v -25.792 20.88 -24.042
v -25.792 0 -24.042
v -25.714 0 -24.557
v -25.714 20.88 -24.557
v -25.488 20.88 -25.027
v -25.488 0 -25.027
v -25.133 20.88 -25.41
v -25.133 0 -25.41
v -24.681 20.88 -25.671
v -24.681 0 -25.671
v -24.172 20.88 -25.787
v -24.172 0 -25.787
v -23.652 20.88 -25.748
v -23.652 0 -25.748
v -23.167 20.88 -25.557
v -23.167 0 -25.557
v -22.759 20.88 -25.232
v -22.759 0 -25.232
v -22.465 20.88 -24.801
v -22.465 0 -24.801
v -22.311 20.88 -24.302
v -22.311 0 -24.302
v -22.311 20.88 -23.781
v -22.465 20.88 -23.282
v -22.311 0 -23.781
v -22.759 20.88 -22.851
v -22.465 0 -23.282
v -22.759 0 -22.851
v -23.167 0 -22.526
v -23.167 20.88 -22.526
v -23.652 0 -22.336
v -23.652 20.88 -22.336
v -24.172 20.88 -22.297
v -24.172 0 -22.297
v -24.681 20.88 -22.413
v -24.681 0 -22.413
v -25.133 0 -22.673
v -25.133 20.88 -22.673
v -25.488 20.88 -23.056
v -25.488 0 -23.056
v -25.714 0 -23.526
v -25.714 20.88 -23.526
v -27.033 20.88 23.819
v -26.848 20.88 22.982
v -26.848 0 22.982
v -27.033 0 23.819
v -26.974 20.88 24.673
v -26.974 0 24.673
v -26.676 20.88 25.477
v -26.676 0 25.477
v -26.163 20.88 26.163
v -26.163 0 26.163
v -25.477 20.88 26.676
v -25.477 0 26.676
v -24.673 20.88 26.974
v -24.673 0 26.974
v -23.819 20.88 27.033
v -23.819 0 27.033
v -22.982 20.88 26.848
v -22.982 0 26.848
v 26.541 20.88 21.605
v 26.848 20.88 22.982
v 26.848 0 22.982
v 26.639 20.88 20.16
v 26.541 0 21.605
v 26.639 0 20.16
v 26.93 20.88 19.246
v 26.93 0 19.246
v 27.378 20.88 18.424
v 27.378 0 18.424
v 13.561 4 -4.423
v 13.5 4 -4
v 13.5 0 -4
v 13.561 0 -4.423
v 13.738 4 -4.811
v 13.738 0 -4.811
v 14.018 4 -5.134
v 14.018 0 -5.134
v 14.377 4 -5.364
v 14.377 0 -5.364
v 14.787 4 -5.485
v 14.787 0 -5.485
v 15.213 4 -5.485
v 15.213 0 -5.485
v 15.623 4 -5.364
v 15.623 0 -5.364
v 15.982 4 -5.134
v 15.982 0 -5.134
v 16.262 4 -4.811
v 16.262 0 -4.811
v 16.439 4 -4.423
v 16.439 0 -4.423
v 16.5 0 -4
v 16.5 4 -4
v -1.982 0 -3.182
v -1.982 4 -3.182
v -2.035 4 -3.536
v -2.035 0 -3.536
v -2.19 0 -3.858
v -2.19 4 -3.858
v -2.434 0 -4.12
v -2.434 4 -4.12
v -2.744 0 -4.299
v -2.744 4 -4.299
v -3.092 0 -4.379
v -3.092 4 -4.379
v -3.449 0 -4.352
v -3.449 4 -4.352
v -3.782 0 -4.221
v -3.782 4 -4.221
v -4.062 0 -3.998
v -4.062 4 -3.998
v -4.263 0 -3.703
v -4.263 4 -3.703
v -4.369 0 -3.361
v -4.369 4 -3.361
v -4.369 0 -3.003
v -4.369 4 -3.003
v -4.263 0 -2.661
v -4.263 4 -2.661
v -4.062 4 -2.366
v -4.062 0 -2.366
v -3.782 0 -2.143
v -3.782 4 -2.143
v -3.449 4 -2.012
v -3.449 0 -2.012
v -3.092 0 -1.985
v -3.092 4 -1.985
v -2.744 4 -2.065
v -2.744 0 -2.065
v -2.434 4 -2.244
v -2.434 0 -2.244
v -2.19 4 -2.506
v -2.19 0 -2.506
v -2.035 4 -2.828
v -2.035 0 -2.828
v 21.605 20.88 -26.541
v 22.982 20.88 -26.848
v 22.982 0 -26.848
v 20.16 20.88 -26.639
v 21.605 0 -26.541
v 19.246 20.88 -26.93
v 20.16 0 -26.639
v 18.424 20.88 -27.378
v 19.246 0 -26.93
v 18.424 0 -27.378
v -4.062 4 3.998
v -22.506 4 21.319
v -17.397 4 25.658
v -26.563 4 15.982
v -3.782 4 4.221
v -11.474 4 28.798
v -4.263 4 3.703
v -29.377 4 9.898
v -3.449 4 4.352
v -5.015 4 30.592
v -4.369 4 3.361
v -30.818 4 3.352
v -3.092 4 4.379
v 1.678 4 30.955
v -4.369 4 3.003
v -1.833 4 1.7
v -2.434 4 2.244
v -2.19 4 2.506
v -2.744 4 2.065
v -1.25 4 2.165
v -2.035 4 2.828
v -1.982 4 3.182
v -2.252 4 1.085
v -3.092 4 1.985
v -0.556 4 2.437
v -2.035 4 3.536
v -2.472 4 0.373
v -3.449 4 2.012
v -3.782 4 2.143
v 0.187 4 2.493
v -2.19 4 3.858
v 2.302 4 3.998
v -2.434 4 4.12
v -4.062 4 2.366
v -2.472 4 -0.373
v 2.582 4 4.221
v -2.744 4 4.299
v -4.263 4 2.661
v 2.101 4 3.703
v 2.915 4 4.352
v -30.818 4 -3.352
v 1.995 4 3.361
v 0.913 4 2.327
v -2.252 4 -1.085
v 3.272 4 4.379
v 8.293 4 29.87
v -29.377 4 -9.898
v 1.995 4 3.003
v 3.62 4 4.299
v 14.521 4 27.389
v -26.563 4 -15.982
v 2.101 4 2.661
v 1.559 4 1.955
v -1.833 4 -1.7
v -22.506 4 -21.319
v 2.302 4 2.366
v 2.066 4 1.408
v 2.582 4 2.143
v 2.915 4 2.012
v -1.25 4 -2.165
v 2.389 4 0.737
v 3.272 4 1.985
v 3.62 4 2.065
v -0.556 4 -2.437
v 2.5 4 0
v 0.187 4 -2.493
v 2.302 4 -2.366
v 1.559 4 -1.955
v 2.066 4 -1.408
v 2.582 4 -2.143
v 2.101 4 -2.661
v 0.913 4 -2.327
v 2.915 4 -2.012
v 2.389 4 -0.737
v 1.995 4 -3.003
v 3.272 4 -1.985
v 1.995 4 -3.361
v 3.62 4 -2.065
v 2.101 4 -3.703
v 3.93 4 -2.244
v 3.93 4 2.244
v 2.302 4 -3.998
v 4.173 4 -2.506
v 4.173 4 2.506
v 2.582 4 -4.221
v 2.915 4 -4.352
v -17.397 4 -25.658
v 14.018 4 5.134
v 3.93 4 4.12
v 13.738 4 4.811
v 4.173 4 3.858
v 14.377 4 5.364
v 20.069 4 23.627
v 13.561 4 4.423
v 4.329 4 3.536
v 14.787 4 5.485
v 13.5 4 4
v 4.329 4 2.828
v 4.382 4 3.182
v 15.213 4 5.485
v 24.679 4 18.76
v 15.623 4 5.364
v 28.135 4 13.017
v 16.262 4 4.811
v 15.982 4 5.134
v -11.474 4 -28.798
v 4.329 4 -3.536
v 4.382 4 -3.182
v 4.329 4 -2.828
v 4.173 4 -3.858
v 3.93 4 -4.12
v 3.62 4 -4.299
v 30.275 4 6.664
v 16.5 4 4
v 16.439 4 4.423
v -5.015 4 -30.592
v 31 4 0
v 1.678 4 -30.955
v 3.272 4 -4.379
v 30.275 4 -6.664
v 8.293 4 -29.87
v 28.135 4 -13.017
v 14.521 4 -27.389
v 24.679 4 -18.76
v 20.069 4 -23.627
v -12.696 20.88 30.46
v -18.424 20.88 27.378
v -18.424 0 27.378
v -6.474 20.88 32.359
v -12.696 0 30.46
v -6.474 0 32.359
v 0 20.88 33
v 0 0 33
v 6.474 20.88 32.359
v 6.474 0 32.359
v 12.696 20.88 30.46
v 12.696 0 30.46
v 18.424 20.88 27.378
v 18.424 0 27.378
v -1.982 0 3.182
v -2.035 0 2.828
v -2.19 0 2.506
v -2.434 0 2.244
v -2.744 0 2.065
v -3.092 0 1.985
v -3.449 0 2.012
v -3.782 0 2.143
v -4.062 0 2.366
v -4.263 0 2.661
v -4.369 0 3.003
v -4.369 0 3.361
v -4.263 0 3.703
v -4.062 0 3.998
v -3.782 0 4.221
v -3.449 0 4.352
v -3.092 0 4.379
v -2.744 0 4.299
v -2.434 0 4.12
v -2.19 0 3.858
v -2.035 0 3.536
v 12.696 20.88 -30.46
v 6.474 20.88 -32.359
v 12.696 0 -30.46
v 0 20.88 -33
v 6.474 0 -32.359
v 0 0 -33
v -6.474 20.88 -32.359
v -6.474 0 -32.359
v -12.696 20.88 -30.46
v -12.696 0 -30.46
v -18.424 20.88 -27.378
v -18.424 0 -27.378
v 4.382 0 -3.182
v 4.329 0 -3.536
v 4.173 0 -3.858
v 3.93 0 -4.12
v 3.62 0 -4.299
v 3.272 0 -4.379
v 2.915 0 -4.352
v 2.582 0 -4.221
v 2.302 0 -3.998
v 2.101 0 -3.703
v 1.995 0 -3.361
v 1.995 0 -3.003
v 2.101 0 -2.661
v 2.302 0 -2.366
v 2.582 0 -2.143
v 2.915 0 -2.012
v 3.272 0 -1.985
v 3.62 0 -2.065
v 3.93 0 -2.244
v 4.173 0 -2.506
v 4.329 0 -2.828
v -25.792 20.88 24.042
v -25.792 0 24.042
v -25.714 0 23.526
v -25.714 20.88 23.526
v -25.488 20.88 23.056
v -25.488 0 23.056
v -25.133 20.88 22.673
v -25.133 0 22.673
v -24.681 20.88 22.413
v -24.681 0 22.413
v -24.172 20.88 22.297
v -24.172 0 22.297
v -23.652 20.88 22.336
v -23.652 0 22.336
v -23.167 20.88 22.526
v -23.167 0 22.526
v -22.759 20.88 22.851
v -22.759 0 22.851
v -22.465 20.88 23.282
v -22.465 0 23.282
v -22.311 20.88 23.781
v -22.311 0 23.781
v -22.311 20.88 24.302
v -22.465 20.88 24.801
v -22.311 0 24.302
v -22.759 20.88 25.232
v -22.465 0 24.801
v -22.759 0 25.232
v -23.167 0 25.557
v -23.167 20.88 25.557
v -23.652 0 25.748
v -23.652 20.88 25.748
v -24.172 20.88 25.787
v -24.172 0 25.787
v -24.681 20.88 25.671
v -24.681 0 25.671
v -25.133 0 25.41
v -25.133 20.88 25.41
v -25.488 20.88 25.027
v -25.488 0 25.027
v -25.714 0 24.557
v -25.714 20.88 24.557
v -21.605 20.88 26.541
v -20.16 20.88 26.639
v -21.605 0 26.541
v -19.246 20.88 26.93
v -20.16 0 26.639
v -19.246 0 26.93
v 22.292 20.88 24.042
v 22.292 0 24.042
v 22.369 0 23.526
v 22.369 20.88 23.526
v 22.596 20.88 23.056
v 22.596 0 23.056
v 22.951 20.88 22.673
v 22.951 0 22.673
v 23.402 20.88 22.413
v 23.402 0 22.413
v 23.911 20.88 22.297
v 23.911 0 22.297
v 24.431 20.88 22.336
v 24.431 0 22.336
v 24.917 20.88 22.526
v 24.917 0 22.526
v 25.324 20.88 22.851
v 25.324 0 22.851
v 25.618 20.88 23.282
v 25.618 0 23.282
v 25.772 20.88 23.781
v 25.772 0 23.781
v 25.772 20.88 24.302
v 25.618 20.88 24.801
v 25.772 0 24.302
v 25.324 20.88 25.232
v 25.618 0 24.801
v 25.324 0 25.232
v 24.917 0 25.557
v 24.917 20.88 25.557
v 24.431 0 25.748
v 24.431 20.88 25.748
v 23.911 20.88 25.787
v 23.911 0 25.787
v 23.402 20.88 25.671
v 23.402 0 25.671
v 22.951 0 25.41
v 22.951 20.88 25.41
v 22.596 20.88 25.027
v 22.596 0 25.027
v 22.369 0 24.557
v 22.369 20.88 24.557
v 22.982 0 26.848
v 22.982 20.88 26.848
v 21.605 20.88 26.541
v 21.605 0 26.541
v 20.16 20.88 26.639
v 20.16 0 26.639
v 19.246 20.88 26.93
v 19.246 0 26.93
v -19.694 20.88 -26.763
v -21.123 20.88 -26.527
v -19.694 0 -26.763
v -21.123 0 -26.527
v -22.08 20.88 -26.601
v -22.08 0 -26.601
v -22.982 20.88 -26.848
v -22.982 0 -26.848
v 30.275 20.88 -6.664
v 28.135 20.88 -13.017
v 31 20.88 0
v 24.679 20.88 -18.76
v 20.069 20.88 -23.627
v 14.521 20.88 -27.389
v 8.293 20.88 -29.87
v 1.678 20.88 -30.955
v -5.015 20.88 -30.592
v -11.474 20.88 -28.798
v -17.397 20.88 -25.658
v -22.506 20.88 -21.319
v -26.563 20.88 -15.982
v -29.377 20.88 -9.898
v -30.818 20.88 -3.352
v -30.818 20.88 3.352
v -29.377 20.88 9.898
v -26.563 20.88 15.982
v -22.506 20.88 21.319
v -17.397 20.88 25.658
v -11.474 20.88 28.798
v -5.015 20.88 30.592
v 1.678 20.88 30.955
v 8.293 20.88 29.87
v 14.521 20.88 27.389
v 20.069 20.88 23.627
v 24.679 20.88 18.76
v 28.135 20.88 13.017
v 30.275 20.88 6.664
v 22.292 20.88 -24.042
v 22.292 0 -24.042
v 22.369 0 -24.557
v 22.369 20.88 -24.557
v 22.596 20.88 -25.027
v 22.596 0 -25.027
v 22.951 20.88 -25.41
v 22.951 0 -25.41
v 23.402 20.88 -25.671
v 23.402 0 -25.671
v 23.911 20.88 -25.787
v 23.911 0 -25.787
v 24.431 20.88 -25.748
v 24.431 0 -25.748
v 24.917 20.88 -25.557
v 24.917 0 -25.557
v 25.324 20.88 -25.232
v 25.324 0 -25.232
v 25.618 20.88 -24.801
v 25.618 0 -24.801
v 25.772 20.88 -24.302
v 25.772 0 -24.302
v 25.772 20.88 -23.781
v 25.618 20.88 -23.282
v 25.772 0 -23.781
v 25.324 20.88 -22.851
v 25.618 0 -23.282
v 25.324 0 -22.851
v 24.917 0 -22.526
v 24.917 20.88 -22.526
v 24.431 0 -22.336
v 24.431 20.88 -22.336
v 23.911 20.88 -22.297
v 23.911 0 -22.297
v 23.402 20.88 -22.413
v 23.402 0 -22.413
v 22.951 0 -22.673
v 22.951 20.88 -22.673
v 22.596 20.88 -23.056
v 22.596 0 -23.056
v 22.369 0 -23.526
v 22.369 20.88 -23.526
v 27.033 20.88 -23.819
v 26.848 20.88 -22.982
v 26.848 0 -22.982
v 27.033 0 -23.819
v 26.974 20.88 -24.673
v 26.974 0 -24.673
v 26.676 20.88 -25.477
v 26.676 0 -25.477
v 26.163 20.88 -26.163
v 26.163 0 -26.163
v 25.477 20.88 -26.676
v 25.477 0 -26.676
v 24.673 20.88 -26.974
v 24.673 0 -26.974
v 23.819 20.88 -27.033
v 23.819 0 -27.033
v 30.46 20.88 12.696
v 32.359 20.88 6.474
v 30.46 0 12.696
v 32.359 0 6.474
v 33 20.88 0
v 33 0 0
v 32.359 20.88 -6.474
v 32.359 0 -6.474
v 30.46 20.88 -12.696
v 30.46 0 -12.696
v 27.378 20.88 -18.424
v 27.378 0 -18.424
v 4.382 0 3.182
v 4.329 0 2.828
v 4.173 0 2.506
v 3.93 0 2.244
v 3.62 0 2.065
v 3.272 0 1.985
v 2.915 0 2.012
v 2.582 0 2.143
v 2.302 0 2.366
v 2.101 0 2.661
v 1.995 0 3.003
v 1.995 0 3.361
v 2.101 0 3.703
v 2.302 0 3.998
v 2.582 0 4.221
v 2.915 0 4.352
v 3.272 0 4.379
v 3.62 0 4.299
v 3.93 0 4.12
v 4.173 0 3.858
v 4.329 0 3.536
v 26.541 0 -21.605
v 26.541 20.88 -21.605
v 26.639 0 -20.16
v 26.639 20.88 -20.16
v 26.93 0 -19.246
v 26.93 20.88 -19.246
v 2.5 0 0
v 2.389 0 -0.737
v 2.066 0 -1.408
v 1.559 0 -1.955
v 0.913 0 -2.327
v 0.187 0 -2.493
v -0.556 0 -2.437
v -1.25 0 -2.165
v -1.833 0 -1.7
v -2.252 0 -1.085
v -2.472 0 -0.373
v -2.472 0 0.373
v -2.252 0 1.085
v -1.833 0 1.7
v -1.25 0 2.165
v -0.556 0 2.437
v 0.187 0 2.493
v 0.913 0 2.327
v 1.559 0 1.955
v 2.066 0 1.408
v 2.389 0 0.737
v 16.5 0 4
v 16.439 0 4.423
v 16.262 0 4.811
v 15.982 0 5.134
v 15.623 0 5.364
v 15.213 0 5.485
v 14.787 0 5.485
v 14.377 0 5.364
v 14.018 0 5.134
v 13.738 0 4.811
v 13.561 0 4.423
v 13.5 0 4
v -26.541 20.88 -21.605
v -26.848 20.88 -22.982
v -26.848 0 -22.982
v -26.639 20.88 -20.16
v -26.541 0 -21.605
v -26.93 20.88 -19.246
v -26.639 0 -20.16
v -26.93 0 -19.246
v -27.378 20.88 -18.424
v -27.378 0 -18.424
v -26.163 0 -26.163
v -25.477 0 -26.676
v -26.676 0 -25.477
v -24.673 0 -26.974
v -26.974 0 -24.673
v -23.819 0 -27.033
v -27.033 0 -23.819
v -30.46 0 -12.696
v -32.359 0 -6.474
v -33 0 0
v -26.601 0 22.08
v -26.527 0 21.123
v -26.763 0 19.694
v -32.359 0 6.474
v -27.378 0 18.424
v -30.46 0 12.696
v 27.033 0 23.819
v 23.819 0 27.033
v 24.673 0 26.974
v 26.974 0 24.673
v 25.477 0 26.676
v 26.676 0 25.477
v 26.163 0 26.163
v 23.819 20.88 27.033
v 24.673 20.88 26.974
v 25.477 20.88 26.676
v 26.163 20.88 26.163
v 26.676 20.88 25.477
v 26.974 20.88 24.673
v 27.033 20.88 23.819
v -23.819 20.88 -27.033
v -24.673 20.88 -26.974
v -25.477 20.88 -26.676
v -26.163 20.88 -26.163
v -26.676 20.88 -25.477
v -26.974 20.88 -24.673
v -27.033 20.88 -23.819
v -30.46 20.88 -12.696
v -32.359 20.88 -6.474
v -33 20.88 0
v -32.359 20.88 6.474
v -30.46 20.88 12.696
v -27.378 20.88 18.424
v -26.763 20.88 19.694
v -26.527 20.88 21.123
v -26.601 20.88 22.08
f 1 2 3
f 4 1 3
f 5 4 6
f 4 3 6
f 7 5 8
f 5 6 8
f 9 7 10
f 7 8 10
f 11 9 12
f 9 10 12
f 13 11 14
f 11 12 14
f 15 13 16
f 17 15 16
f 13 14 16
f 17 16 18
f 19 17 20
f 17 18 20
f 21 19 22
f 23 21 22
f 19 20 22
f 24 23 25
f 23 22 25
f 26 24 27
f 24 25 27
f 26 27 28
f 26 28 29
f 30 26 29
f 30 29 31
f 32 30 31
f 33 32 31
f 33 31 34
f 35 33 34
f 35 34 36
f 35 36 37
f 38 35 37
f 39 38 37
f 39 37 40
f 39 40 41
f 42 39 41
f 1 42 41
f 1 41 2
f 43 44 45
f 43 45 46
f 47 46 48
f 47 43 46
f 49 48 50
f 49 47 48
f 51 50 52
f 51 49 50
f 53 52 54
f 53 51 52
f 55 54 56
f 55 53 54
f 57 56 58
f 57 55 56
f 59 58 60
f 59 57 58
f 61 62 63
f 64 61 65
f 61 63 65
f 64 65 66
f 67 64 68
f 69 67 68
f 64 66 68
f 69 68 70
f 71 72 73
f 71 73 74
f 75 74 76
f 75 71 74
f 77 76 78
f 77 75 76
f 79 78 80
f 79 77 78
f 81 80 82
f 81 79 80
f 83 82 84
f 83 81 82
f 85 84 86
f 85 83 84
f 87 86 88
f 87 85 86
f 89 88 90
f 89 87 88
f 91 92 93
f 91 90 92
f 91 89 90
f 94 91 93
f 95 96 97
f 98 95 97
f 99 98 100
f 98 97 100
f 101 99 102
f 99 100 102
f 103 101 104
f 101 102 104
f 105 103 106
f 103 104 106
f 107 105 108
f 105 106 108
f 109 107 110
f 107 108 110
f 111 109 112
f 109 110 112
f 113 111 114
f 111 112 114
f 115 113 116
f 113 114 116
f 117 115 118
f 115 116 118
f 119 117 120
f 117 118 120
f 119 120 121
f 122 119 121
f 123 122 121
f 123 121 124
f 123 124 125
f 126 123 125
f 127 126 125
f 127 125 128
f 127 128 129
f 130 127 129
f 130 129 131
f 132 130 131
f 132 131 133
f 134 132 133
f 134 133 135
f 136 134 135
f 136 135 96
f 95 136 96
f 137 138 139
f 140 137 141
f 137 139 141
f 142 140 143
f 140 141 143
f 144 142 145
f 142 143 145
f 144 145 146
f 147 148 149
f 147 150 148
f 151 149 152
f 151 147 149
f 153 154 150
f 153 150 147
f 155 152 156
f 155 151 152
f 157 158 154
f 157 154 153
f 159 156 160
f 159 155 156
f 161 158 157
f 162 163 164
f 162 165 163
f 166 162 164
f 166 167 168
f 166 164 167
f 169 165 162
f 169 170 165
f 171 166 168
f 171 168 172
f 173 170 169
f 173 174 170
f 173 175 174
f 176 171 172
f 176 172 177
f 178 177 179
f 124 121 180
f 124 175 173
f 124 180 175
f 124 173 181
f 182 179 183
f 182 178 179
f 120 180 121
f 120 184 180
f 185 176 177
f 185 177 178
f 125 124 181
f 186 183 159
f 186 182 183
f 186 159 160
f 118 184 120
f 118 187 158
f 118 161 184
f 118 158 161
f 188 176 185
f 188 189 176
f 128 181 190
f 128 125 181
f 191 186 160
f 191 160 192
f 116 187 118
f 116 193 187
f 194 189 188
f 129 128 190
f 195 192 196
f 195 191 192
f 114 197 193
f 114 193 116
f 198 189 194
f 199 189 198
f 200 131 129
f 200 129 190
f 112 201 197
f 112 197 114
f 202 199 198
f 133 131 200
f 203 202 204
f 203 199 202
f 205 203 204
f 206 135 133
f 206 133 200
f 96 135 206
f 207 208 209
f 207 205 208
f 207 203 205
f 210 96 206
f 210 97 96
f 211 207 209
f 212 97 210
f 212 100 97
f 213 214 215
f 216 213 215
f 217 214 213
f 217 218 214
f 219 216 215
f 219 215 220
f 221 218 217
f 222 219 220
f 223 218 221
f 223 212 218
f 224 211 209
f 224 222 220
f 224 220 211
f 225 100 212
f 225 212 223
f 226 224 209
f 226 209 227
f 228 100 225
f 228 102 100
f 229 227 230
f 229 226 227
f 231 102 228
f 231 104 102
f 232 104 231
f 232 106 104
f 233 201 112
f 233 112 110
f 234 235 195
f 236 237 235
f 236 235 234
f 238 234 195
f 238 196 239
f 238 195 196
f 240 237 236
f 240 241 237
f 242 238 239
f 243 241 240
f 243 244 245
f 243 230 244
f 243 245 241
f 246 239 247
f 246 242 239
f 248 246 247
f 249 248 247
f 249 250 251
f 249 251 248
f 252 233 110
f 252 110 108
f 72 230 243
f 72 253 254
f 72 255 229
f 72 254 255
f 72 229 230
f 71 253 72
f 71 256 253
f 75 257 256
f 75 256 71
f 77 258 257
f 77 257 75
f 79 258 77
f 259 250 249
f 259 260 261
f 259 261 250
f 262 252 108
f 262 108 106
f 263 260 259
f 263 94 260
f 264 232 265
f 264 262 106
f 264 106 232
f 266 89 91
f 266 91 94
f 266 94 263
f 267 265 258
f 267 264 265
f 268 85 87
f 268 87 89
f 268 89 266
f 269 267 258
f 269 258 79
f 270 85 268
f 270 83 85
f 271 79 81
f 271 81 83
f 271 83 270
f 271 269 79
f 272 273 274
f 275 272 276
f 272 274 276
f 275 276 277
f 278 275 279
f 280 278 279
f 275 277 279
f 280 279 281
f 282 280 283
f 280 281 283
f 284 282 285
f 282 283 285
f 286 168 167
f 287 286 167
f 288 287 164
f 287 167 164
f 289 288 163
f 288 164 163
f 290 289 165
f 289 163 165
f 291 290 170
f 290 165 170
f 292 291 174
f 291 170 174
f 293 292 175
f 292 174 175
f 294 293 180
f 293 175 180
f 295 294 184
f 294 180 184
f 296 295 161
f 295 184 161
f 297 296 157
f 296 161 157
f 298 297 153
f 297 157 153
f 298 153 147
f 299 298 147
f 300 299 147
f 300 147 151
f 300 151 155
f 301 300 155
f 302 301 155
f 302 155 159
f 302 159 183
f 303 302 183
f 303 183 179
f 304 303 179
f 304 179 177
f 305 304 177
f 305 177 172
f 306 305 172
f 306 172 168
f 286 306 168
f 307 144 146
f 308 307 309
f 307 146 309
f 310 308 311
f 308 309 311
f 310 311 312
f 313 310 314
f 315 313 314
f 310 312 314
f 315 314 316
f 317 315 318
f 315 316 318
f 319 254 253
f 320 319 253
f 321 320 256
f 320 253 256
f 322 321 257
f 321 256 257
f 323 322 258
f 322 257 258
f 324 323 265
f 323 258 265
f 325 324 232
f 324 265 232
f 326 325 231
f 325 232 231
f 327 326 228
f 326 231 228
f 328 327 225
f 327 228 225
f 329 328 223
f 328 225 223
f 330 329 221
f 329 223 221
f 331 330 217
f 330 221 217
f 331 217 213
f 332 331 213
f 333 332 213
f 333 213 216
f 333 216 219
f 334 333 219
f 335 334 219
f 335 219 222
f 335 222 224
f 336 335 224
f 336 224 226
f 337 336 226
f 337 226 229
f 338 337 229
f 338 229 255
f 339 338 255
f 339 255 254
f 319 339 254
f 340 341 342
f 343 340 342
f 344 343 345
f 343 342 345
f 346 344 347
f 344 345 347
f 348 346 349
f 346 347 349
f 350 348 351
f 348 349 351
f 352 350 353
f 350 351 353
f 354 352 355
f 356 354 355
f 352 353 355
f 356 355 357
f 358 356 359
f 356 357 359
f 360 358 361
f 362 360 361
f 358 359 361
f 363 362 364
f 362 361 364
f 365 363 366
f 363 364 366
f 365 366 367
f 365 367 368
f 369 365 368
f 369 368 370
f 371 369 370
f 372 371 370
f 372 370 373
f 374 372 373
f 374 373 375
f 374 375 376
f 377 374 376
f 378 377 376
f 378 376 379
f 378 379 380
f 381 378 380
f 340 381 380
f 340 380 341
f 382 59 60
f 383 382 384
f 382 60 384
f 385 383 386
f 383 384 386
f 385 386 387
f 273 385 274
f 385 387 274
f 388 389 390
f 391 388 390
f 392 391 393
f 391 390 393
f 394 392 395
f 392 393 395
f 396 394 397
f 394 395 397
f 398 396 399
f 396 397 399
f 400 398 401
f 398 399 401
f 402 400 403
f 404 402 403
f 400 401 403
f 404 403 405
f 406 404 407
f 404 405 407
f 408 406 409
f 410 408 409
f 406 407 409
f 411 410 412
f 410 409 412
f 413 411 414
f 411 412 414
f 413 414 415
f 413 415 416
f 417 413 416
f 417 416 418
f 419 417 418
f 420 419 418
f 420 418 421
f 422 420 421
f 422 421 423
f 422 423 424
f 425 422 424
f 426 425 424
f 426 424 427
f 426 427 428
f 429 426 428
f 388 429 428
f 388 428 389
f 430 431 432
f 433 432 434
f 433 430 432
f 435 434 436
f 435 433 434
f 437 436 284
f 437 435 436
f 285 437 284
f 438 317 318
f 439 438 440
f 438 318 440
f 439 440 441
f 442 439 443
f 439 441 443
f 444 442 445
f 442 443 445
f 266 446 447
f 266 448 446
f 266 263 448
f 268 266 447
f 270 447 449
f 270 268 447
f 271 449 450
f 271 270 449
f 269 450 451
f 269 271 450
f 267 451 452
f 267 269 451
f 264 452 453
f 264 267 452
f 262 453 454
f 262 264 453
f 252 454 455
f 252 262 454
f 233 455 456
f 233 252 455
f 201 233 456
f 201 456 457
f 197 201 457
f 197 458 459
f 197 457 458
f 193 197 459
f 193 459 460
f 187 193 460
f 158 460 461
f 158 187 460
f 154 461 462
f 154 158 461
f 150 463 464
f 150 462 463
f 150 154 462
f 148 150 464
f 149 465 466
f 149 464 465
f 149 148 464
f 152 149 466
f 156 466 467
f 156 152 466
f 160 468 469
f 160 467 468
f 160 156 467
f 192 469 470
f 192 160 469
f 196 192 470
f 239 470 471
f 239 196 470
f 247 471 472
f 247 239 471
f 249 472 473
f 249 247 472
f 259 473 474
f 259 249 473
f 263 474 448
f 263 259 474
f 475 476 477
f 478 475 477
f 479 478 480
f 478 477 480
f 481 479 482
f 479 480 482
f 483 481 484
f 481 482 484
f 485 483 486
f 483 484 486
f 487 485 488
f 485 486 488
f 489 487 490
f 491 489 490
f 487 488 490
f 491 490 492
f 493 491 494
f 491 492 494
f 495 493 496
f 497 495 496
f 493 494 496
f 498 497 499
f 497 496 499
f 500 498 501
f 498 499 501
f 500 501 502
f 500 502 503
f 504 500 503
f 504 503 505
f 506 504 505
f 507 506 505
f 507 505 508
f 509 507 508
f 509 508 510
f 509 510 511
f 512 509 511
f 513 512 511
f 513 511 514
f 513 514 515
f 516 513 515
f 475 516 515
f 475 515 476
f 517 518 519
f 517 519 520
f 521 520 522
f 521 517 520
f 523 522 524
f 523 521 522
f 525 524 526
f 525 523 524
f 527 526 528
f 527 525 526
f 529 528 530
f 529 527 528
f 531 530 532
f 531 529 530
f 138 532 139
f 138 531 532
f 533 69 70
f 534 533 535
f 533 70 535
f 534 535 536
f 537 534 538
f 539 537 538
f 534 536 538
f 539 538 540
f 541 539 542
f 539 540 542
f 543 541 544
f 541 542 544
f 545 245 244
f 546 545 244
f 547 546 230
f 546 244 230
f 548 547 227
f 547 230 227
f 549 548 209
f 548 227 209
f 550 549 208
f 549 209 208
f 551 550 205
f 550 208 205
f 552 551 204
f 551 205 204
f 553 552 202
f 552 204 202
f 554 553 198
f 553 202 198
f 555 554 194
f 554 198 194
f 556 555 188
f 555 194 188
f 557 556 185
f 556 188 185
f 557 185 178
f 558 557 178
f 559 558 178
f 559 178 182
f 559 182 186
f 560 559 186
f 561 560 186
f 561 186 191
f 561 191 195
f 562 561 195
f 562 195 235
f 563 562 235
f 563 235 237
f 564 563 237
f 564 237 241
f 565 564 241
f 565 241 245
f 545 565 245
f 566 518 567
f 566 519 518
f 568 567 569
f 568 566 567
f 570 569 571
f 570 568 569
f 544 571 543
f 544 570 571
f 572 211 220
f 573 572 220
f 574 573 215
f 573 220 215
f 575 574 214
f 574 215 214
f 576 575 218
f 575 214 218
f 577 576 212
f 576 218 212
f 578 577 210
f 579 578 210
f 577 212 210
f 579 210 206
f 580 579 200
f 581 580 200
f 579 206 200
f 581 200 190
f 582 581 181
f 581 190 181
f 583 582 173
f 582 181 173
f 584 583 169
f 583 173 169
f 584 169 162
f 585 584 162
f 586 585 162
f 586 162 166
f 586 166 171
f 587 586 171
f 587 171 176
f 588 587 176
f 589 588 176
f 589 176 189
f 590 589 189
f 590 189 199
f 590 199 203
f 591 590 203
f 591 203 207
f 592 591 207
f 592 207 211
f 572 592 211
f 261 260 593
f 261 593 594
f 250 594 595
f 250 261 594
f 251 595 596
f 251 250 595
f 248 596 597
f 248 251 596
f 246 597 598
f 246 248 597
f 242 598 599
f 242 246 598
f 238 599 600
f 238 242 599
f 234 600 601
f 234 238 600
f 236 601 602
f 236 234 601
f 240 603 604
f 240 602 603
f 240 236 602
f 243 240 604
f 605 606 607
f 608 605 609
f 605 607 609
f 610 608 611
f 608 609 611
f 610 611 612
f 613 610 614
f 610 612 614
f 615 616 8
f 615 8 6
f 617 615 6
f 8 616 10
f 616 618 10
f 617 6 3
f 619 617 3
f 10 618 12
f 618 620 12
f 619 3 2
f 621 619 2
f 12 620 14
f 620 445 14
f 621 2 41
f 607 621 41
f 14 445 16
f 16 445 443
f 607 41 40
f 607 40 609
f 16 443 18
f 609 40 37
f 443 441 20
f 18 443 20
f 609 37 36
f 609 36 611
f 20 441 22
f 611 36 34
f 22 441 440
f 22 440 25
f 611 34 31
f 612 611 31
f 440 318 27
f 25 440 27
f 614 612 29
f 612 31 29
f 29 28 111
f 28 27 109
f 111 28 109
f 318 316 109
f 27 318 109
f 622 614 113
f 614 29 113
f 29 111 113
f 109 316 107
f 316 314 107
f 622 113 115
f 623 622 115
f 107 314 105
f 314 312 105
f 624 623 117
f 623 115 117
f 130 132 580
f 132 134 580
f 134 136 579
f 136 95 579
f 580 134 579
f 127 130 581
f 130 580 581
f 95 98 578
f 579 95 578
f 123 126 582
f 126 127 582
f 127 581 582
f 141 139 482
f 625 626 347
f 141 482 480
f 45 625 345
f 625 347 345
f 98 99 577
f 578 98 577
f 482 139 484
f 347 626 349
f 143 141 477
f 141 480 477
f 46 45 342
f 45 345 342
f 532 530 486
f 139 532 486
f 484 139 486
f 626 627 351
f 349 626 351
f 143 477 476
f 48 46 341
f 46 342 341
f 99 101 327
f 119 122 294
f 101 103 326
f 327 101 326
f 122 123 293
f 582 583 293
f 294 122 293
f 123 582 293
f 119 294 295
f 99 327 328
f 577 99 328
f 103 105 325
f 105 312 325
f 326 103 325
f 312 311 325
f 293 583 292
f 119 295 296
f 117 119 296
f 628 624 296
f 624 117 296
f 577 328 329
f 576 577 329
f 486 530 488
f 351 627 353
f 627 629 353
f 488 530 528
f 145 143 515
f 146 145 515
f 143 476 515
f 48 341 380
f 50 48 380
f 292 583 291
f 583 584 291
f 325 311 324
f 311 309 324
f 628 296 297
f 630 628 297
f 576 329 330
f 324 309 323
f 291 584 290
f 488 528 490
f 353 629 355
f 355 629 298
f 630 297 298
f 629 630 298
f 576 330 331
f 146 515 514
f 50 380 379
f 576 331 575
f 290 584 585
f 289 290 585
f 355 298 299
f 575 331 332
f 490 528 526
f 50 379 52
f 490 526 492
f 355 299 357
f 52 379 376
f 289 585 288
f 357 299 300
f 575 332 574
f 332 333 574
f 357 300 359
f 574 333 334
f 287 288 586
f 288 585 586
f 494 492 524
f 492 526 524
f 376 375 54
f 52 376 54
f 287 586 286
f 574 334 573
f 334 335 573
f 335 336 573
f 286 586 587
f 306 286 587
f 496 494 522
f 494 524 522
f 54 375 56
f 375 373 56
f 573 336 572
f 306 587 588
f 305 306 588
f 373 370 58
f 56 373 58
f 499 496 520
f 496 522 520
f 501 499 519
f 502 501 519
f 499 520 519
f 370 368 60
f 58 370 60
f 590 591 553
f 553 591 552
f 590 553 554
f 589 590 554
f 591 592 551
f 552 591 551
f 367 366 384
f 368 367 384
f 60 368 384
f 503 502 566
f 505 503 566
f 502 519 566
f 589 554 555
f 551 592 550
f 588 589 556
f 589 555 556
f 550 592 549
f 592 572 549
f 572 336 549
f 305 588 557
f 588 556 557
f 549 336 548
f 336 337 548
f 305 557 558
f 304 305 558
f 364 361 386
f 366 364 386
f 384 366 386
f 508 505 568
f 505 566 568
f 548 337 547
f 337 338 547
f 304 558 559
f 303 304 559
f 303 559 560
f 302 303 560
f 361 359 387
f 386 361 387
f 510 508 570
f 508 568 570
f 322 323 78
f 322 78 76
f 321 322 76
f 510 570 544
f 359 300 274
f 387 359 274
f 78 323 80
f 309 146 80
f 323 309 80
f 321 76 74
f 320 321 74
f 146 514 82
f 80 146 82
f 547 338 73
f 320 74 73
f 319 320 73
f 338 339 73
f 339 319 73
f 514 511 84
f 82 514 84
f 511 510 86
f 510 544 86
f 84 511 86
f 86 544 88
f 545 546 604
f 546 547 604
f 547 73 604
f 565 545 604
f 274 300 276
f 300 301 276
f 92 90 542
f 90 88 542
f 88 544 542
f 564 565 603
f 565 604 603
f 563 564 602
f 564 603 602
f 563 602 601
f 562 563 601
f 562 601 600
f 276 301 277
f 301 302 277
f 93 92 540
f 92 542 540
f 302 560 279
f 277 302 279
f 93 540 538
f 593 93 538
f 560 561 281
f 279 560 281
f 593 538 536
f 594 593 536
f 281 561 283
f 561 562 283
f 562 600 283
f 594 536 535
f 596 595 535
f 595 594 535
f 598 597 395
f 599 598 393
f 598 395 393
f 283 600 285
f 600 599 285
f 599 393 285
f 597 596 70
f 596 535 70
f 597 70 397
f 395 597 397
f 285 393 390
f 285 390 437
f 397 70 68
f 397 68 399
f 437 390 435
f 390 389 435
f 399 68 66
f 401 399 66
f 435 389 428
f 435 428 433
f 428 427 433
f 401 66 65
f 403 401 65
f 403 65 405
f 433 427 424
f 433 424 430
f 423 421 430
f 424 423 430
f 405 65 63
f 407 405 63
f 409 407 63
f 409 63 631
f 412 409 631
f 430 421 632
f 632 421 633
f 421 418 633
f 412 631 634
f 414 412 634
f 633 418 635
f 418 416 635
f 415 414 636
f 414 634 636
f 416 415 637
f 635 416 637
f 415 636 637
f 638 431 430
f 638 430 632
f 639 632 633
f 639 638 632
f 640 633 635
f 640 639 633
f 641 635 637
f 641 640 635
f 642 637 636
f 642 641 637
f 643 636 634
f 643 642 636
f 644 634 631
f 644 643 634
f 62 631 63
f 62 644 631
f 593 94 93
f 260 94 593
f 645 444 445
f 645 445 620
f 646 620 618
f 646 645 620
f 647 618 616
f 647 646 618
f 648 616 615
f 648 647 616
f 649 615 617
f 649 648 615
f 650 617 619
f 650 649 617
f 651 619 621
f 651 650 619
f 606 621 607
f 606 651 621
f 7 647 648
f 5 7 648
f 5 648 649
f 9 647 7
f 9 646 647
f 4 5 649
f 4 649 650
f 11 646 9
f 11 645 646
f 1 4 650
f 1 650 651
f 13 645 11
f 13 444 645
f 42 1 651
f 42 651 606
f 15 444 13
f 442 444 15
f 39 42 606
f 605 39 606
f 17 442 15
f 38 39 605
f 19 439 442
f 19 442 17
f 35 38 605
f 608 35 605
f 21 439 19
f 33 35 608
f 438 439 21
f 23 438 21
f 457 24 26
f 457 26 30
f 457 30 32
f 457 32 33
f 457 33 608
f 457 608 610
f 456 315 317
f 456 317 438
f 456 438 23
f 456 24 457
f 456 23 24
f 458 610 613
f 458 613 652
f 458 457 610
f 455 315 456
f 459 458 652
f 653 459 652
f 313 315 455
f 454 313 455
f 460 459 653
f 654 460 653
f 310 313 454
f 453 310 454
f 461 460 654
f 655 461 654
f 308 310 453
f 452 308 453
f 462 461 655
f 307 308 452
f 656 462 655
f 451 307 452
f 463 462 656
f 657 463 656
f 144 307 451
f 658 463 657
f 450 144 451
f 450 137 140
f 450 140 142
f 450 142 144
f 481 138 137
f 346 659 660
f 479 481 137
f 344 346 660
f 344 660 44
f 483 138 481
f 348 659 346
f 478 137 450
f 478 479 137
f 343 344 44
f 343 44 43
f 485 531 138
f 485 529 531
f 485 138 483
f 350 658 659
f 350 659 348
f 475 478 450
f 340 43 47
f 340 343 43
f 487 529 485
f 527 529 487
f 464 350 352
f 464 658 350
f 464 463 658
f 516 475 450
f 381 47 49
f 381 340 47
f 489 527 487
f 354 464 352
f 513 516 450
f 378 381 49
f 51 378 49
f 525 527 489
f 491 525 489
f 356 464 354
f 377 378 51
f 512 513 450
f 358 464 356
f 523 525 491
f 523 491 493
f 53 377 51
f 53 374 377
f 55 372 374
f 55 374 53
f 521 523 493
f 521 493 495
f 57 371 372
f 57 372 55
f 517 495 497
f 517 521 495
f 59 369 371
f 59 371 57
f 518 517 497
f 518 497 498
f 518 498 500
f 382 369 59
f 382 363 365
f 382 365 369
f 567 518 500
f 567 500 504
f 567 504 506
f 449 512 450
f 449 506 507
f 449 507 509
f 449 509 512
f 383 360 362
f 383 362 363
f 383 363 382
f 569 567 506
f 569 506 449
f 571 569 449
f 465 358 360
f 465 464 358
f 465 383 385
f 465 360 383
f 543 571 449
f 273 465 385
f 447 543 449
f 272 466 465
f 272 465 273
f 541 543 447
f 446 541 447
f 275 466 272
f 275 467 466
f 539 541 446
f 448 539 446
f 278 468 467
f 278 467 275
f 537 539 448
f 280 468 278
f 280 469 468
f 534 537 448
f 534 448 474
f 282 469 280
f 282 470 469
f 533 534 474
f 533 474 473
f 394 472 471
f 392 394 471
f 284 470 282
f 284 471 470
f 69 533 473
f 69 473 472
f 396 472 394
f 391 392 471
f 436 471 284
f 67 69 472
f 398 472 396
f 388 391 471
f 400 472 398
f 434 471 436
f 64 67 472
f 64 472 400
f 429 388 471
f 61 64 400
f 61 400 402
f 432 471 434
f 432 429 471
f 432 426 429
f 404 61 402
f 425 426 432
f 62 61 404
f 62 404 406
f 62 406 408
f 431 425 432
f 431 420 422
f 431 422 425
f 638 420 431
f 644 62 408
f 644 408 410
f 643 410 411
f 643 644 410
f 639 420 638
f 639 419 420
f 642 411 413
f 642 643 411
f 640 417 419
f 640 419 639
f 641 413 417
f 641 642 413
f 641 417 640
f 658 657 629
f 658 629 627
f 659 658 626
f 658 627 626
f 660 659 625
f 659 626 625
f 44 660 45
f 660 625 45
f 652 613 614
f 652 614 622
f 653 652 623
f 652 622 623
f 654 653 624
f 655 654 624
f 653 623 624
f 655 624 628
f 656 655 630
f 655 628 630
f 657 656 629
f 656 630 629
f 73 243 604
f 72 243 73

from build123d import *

# Parameters (mm, degrees)
SKETCH1_R                = 33
BOSS_EXTRUDE1_DEPTH      = 4
SKETCH2_R                = 33
SKETCH2_R_2              = 31
BOSS_EXTRUDE2_DEPTH      = 16.88
M2_CLEARANCE_HOLE1_D     = 2.4
SKETCH13_R               = 2.5
CUT_EXTRUDE3_DEPTH       = 5
CUT_EXTRUDE2_DEPTH       = 5
SKETCH15_R               = 3
BOSS_EXTRUDE3_DEPTH      = 20.88
FILLET1_R                = 5
CIRPATTERN1_COUNT        = 4
FILLET1_OF_CIRPATTERN1_R = 5
F_3_0_MM_DOWEL_HOLES1_D  = 3.5


with BuildPart() as part:
    # Sketch1 → Boss-Extrude1 (new body)
    with BuildSketch(Plane(origin=(0, 0, 0), x_dir=(1, 0, 0), z_dir=(0, 1, 0))):
        Circle(SKETCH1_R)
    extrude(amount=BOSS_EXTRUDE1_DEPTH)

    # Sketch2 → Boss-Extrude2 (add)
    with BuildSketch(Plane(origin=(0, 4, 0), x_dir=(1, 0, 0), z_dir=(0, 1, 0))):
        Circle(SKETCH2_R)
        Circle(SKETCH2_R_2, mode=Mode.SUBTRACT)
    extrude(amount=BOSS_EXTRUDE2_DEPTH)

    # M2 Clearance Hole1 (through all)
    with Locations(Plane(origin=(0, 0, 0), x_dir=(-1, 0, 0), z_dir=(0, -1, 0))):
        with Locations((3.181980515, 3.181980515), (3.181980515, -3.181980515), (-3.181980515, -3.181980515), (-3.181980515, 3.181980515)):
            Hole(M2_CLEARANCE_HOLE1_D / 2)

    # Sketch13 → Cut-Extrude3 (cut, through all)
    with BuildSketch(Plane(origin=(0, 4, 0), x_dir=(1, 0, 0), z_dir=(0, 1, 0))):
        Circle(SKETCH13_R)
    extrude(amount=-CUT_EXTRUDE3_DEPTH, mode=Mode.SUBTRACT)

    # Sketch10 → Cut-Extrude2 (cut, through all)
    with BuildSketch(Plane(origin=(0, 4, 0), x_dir=(1, 0, 0), z_dir=(0, 1, 0))):
        with BuildLine():
            Line((13.5, -4), (13.5, 4))
            ThreePointArc((13.5, 4), (15, 5.5), (16.5, 4))
            Line((16.5, 4), (16.5, -4))
            ThreePointArc((16.5, -4), (15, -5.5), (13.5, -4))
        make_face()
    extrude(amount=-CUT_EXTRUDE2_DEPTH, mode=Mode.SUBTRACT)

    # Sketch15 → Boss-Extrude3 (add, through all)
    with BuildSketch(Plane(origin=(0, 20.88, 0), x_dir=(1, 0, 0), z_dir=(0, 1, 0))):
        with Locations((24.04163056, 24.04163056)):
            Circle(SKETCH15_R)
    boss_extrude3 = extrude(amount=-BOSS_EXTRUDE3_DEPTH)

    # Fillet1
    fillet1_edges = [part.edges().sort_by_distance(p)[0] for p in [
        (25.219946573, 10.44, -21.282722919),
        (21.282722919, 10.44, -25.219946573),
    ]]
    fillet(fillet1_edges, radius=FILLET1_R)

    # CirPattern1: Boss-Extrude3 ×4 about axis
    cirpattern1_axis = Axis((0, 0, 0), (0, 1, 0))
    for i in range(1, CIRPATTERN1_COUNT):
        add(boss_extrude3.rotate(cirpattern1_axis, i * 360 / CIRPATTERN1_COUNT))

    # Fillet1 of CirPattern1
    fillet1_of_cirpattern1_edges = [part.edges().sort_by_distance(p)[0] for p in [
        (-21.282722919, 10.44, -25.219946573),
        (-25.219946573, 10.44, -21.282722919),
        (-25.219946573, 10.44, 21.282722919),
        (-21.282722919, 10.44, 25.219946573),
        (21.282722919, 10.44, 25.219946573),
        (25.219946573, 10.44, 21.282722919),
    ]]
    fillet(fillet1_of_cirpattern1_edges, radius=FILLET1_OF_CIRPATTERN1_R)

    # Ø3.0 mm Dowel Holes1 (through all)
    with Locations(Plane(origin=(0, 20.88, 0), x_dir=(1, 0, 0), z_dir=(0, 1, 0))):
        with Locations((24.04163056, -24.04163056), (-24.04163056, -24.04163056), (-24.04163056, 24.04163056), (24.04163056, 24.04163056)):
            Hole(F_3_0_MM_DOWEL_HOLES1_D / 2)


solid = part.part
